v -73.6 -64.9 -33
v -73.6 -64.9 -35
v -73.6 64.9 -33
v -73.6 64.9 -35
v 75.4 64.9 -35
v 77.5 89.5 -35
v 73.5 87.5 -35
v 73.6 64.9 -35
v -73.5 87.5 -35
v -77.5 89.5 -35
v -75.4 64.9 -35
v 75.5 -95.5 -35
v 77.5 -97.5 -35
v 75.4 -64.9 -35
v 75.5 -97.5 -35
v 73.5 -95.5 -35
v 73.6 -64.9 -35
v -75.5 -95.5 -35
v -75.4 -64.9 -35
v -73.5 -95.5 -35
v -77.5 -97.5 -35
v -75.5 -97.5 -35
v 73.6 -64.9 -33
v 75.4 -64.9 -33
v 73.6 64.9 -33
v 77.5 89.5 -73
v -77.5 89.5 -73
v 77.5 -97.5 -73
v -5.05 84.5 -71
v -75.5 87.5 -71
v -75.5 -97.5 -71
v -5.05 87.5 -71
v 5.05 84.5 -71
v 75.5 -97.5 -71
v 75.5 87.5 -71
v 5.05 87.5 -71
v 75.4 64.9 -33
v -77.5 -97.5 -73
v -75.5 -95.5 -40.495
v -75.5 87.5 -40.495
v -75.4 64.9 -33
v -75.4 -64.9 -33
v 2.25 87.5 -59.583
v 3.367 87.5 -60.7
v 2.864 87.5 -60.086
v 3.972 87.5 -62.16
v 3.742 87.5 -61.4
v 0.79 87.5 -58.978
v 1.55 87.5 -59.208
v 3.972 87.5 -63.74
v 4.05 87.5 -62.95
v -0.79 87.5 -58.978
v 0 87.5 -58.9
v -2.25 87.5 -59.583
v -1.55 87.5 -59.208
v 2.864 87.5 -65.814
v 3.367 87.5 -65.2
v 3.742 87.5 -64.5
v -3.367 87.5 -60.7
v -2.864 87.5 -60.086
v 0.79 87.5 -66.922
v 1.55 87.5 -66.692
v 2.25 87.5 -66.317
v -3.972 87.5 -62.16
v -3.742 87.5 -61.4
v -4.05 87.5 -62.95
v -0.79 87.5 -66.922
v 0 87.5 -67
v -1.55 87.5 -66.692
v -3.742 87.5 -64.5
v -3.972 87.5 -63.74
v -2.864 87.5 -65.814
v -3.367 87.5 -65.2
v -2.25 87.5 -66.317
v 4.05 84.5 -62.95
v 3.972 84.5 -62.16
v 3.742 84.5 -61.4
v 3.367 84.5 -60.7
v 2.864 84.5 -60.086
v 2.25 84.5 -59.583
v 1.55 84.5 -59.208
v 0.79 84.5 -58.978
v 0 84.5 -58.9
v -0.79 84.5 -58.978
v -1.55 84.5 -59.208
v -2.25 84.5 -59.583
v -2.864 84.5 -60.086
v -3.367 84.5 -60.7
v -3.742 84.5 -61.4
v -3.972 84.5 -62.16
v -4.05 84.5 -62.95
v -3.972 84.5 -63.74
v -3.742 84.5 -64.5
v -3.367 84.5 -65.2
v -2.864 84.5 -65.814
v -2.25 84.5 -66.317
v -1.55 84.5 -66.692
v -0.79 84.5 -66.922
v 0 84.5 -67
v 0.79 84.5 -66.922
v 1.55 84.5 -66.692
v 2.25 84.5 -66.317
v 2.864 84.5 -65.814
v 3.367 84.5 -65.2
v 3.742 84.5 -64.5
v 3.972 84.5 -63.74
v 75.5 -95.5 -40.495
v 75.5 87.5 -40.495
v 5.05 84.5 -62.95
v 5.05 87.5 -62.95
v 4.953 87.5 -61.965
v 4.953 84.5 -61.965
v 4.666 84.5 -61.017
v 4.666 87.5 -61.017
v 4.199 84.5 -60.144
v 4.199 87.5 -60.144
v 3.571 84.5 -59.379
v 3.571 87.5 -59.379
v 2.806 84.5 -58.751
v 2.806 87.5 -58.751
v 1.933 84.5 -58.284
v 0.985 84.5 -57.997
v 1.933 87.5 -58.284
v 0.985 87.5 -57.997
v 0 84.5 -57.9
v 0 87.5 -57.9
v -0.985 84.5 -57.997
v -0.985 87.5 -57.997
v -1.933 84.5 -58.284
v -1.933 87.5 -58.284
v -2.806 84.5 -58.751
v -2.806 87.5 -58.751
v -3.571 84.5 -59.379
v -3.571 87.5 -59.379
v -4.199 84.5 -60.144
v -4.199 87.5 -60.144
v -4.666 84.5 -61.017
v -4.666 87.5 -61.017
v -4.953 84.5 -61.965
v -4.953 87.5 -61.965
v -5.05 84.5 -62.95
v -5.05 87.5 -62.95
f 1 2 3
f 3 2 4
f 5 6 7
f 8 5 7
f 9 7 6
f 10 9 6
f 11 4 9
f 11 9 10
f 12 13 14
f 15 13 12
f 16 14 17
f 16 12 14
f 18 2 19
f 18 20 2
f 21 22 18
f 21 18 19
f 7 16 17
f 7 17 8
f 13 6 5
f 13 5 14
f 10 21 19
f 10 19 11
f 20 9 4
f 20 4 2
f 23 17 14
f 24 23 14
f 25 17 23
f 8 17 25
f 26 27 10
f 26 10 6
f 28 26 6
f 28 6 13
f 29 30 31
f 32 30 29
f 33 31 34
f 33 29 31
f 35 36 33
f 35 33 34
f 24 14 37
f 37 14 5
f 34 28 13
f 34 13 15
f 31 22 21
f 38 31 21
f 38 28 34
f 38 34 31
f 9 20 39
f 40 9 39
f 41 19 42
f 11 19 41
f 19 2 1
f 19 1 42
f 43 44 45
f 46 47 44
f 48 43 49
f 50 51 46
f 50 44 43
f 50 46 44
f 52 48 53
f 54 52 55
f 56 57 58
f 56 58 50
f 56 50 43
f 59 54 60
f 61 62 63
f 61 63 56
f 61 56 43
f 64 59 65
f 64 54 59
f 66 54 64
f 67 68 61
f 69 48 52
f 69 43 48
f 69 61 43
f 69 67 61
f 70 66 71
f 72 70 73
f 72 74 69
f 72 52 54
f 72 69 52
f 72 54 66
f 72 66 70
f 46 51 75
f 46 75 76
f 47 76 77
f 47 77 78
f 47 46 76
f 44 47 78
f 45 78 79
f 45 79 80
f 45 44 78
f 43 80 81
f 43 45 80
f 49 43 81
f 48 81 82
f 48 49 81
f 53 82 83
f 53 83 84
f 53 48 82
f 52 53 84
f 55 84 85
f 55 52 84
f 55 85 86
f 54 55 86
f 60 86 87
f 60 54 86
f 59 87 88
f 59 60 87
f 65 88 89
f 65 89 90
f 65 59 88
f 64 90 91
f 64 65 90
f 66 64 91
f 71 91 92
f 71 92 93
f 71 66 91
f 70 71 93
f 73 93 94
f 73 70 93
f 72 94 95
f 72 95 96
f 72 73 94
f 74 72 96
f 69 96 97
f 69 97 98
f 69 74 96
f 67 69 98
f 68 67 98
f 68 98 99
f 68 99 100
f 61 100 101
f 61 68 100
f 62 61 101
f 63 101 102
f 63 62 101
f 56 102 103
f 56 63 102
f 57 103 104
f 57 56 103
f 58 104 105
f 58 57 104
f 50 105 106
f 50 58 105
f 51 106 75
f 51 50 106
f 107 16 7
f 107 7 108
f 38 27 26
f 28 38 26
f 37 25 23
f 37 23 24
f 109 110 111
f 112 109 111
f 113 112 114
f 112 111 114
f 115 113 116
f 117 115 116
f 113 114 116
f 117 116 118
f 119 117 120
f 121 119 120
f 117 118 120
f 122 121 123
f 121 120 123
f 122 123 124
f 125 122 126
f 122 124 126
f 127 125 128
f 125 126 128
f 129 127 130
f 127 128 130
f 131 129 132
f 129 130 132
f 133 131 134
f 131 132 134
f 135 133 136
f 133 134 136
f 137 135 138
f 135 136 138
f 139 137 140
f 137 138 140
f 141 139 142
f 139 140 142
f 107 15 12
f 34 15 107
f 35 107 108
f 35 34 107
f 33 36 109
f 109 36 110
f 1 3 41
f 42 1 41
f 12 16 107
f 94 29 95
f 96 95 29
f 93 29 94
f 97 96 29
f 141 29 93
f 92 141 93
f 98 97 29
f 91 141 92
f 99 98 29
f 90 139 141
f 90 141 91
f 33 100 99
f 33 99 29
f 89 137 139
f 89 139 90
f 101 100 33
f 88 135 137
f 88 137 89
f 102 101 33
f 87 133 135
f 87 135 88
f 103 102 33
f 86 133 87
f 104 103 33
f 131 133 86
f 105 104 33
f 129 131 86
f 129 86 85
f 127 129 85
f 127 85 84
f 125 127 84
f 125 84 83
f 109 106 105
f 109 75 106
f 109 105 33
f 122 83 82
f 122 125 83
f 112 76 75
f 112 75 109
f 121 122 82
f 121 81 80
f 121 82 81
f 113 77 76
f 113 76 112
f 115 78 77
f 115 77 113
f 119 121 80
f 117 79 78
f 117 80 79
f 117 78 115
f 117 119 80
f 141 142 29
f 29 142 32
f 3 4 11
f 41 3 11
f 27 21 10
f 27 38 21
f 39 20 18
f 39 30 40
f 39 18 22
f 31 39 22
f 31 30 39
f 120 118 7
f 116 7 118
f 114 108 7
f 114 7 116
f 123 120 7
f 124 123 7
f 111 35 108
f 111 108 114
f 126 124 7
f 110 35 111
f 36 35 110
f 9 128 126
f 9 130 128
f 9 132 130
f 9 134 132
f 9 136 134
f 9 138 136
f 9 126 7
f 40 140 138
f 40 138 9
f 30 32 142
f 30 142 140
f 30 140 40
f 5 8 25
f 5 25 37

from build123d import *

# Parameters (mm, degrees)
SKETCH049_W  = 155
SKETCH049_H  = 187
PAD013_DEPTH = 2
PAD014_DEPTH = 36
PAD015_DEPTH = 183
SKETCH055_W  = 1.8
SKETCH055_H  = 129.8
PAD016_DEPTH = 2
SKETCH081_R  = 4.05
PAD027_DEPTH = 3


with BuildPart() as part:
    # Sketch049 → Pad013 (new body)
    with BuildSketch(Plane.XY):
        with Locations((0, -4)):
            Rectangle(SKETCH049_W, SKETCH049_H)
    extrude(amount=PAD013_DEPTH)

    # Sketch050 (on DatumPlane) → Pad014 (join)
    with BuildSketch(Plane.XY.offset(2)):
        Polygon((-77.5, -97.5), (-77.5, 89.5), (77.5, 89.5), (77.5, -97.5), (75.5, -97.5), (75.5, 87.5), (-75.5, 87.5), (-75.5, -97.5), align=None)
    extrude(amount=PAD014_DEPTH)

    # Sketch051 (on DatumPlane) → Pad015 (join)
    with BuildSketch(Plane.XZ.offset(95.5)):
        Polygon((-75.5, 32.505045), (-75.5, 38), (-73.5, 38), align=None)
    pad015 = extrude(amount=-PAD015_DEPTH)

    # Mirrored006: Pad015 across Sketch051 V_Axis
    add(pad015.mirror(Plane(origin=(0, -95.5, 0), x_dir=(0, -1, 0), z_dir=(1, 0, 0))))

    # Sketch055 (on DatumPlane) → Pad016 (join)
    with BuildSketch(Plane.XY.offset(38)):
        with Locations((74.5, 0)):
            Rectangle(SKETCH055_W, SKETCH055_H)
    pad016 = extrude(amount=PAD016_DEPTH)

    # Mirrored008: Pad016 across Sketch055 V_Axis
    add(pad016.mirror(Plane(origin=(0, 0, 38), x_dir=(0, 0, 1), z_dir=(1, 0, 0))))

    # Sketch081 (on DatumPlane) → Pad027 (join)
    with BuildSketch(Plane.XZ.offset(-87.5)):
        with BuildLine():
            ThreePointArc((5.05, 10.05), (0, 15.1), (-5.05, 10.05))
            Line((-5.05, 10.05), (-5.05, 2))
            Line((-5.05, 2), (5.05, 2))
            Line((5.05, 2), (5.05, 10.05))
        make_face()
        with Locations((0, 10.05)):
            Circle(SKETCH081_R, mode=Mode.SUBTRACT)
    extrude(amount=PAD027_DEPTH)


with BuildPart() as part_1:
    # Body006 placement: moved
    add(part.part.moved(Location((0, 0, -73))))


solid = part_1.part
